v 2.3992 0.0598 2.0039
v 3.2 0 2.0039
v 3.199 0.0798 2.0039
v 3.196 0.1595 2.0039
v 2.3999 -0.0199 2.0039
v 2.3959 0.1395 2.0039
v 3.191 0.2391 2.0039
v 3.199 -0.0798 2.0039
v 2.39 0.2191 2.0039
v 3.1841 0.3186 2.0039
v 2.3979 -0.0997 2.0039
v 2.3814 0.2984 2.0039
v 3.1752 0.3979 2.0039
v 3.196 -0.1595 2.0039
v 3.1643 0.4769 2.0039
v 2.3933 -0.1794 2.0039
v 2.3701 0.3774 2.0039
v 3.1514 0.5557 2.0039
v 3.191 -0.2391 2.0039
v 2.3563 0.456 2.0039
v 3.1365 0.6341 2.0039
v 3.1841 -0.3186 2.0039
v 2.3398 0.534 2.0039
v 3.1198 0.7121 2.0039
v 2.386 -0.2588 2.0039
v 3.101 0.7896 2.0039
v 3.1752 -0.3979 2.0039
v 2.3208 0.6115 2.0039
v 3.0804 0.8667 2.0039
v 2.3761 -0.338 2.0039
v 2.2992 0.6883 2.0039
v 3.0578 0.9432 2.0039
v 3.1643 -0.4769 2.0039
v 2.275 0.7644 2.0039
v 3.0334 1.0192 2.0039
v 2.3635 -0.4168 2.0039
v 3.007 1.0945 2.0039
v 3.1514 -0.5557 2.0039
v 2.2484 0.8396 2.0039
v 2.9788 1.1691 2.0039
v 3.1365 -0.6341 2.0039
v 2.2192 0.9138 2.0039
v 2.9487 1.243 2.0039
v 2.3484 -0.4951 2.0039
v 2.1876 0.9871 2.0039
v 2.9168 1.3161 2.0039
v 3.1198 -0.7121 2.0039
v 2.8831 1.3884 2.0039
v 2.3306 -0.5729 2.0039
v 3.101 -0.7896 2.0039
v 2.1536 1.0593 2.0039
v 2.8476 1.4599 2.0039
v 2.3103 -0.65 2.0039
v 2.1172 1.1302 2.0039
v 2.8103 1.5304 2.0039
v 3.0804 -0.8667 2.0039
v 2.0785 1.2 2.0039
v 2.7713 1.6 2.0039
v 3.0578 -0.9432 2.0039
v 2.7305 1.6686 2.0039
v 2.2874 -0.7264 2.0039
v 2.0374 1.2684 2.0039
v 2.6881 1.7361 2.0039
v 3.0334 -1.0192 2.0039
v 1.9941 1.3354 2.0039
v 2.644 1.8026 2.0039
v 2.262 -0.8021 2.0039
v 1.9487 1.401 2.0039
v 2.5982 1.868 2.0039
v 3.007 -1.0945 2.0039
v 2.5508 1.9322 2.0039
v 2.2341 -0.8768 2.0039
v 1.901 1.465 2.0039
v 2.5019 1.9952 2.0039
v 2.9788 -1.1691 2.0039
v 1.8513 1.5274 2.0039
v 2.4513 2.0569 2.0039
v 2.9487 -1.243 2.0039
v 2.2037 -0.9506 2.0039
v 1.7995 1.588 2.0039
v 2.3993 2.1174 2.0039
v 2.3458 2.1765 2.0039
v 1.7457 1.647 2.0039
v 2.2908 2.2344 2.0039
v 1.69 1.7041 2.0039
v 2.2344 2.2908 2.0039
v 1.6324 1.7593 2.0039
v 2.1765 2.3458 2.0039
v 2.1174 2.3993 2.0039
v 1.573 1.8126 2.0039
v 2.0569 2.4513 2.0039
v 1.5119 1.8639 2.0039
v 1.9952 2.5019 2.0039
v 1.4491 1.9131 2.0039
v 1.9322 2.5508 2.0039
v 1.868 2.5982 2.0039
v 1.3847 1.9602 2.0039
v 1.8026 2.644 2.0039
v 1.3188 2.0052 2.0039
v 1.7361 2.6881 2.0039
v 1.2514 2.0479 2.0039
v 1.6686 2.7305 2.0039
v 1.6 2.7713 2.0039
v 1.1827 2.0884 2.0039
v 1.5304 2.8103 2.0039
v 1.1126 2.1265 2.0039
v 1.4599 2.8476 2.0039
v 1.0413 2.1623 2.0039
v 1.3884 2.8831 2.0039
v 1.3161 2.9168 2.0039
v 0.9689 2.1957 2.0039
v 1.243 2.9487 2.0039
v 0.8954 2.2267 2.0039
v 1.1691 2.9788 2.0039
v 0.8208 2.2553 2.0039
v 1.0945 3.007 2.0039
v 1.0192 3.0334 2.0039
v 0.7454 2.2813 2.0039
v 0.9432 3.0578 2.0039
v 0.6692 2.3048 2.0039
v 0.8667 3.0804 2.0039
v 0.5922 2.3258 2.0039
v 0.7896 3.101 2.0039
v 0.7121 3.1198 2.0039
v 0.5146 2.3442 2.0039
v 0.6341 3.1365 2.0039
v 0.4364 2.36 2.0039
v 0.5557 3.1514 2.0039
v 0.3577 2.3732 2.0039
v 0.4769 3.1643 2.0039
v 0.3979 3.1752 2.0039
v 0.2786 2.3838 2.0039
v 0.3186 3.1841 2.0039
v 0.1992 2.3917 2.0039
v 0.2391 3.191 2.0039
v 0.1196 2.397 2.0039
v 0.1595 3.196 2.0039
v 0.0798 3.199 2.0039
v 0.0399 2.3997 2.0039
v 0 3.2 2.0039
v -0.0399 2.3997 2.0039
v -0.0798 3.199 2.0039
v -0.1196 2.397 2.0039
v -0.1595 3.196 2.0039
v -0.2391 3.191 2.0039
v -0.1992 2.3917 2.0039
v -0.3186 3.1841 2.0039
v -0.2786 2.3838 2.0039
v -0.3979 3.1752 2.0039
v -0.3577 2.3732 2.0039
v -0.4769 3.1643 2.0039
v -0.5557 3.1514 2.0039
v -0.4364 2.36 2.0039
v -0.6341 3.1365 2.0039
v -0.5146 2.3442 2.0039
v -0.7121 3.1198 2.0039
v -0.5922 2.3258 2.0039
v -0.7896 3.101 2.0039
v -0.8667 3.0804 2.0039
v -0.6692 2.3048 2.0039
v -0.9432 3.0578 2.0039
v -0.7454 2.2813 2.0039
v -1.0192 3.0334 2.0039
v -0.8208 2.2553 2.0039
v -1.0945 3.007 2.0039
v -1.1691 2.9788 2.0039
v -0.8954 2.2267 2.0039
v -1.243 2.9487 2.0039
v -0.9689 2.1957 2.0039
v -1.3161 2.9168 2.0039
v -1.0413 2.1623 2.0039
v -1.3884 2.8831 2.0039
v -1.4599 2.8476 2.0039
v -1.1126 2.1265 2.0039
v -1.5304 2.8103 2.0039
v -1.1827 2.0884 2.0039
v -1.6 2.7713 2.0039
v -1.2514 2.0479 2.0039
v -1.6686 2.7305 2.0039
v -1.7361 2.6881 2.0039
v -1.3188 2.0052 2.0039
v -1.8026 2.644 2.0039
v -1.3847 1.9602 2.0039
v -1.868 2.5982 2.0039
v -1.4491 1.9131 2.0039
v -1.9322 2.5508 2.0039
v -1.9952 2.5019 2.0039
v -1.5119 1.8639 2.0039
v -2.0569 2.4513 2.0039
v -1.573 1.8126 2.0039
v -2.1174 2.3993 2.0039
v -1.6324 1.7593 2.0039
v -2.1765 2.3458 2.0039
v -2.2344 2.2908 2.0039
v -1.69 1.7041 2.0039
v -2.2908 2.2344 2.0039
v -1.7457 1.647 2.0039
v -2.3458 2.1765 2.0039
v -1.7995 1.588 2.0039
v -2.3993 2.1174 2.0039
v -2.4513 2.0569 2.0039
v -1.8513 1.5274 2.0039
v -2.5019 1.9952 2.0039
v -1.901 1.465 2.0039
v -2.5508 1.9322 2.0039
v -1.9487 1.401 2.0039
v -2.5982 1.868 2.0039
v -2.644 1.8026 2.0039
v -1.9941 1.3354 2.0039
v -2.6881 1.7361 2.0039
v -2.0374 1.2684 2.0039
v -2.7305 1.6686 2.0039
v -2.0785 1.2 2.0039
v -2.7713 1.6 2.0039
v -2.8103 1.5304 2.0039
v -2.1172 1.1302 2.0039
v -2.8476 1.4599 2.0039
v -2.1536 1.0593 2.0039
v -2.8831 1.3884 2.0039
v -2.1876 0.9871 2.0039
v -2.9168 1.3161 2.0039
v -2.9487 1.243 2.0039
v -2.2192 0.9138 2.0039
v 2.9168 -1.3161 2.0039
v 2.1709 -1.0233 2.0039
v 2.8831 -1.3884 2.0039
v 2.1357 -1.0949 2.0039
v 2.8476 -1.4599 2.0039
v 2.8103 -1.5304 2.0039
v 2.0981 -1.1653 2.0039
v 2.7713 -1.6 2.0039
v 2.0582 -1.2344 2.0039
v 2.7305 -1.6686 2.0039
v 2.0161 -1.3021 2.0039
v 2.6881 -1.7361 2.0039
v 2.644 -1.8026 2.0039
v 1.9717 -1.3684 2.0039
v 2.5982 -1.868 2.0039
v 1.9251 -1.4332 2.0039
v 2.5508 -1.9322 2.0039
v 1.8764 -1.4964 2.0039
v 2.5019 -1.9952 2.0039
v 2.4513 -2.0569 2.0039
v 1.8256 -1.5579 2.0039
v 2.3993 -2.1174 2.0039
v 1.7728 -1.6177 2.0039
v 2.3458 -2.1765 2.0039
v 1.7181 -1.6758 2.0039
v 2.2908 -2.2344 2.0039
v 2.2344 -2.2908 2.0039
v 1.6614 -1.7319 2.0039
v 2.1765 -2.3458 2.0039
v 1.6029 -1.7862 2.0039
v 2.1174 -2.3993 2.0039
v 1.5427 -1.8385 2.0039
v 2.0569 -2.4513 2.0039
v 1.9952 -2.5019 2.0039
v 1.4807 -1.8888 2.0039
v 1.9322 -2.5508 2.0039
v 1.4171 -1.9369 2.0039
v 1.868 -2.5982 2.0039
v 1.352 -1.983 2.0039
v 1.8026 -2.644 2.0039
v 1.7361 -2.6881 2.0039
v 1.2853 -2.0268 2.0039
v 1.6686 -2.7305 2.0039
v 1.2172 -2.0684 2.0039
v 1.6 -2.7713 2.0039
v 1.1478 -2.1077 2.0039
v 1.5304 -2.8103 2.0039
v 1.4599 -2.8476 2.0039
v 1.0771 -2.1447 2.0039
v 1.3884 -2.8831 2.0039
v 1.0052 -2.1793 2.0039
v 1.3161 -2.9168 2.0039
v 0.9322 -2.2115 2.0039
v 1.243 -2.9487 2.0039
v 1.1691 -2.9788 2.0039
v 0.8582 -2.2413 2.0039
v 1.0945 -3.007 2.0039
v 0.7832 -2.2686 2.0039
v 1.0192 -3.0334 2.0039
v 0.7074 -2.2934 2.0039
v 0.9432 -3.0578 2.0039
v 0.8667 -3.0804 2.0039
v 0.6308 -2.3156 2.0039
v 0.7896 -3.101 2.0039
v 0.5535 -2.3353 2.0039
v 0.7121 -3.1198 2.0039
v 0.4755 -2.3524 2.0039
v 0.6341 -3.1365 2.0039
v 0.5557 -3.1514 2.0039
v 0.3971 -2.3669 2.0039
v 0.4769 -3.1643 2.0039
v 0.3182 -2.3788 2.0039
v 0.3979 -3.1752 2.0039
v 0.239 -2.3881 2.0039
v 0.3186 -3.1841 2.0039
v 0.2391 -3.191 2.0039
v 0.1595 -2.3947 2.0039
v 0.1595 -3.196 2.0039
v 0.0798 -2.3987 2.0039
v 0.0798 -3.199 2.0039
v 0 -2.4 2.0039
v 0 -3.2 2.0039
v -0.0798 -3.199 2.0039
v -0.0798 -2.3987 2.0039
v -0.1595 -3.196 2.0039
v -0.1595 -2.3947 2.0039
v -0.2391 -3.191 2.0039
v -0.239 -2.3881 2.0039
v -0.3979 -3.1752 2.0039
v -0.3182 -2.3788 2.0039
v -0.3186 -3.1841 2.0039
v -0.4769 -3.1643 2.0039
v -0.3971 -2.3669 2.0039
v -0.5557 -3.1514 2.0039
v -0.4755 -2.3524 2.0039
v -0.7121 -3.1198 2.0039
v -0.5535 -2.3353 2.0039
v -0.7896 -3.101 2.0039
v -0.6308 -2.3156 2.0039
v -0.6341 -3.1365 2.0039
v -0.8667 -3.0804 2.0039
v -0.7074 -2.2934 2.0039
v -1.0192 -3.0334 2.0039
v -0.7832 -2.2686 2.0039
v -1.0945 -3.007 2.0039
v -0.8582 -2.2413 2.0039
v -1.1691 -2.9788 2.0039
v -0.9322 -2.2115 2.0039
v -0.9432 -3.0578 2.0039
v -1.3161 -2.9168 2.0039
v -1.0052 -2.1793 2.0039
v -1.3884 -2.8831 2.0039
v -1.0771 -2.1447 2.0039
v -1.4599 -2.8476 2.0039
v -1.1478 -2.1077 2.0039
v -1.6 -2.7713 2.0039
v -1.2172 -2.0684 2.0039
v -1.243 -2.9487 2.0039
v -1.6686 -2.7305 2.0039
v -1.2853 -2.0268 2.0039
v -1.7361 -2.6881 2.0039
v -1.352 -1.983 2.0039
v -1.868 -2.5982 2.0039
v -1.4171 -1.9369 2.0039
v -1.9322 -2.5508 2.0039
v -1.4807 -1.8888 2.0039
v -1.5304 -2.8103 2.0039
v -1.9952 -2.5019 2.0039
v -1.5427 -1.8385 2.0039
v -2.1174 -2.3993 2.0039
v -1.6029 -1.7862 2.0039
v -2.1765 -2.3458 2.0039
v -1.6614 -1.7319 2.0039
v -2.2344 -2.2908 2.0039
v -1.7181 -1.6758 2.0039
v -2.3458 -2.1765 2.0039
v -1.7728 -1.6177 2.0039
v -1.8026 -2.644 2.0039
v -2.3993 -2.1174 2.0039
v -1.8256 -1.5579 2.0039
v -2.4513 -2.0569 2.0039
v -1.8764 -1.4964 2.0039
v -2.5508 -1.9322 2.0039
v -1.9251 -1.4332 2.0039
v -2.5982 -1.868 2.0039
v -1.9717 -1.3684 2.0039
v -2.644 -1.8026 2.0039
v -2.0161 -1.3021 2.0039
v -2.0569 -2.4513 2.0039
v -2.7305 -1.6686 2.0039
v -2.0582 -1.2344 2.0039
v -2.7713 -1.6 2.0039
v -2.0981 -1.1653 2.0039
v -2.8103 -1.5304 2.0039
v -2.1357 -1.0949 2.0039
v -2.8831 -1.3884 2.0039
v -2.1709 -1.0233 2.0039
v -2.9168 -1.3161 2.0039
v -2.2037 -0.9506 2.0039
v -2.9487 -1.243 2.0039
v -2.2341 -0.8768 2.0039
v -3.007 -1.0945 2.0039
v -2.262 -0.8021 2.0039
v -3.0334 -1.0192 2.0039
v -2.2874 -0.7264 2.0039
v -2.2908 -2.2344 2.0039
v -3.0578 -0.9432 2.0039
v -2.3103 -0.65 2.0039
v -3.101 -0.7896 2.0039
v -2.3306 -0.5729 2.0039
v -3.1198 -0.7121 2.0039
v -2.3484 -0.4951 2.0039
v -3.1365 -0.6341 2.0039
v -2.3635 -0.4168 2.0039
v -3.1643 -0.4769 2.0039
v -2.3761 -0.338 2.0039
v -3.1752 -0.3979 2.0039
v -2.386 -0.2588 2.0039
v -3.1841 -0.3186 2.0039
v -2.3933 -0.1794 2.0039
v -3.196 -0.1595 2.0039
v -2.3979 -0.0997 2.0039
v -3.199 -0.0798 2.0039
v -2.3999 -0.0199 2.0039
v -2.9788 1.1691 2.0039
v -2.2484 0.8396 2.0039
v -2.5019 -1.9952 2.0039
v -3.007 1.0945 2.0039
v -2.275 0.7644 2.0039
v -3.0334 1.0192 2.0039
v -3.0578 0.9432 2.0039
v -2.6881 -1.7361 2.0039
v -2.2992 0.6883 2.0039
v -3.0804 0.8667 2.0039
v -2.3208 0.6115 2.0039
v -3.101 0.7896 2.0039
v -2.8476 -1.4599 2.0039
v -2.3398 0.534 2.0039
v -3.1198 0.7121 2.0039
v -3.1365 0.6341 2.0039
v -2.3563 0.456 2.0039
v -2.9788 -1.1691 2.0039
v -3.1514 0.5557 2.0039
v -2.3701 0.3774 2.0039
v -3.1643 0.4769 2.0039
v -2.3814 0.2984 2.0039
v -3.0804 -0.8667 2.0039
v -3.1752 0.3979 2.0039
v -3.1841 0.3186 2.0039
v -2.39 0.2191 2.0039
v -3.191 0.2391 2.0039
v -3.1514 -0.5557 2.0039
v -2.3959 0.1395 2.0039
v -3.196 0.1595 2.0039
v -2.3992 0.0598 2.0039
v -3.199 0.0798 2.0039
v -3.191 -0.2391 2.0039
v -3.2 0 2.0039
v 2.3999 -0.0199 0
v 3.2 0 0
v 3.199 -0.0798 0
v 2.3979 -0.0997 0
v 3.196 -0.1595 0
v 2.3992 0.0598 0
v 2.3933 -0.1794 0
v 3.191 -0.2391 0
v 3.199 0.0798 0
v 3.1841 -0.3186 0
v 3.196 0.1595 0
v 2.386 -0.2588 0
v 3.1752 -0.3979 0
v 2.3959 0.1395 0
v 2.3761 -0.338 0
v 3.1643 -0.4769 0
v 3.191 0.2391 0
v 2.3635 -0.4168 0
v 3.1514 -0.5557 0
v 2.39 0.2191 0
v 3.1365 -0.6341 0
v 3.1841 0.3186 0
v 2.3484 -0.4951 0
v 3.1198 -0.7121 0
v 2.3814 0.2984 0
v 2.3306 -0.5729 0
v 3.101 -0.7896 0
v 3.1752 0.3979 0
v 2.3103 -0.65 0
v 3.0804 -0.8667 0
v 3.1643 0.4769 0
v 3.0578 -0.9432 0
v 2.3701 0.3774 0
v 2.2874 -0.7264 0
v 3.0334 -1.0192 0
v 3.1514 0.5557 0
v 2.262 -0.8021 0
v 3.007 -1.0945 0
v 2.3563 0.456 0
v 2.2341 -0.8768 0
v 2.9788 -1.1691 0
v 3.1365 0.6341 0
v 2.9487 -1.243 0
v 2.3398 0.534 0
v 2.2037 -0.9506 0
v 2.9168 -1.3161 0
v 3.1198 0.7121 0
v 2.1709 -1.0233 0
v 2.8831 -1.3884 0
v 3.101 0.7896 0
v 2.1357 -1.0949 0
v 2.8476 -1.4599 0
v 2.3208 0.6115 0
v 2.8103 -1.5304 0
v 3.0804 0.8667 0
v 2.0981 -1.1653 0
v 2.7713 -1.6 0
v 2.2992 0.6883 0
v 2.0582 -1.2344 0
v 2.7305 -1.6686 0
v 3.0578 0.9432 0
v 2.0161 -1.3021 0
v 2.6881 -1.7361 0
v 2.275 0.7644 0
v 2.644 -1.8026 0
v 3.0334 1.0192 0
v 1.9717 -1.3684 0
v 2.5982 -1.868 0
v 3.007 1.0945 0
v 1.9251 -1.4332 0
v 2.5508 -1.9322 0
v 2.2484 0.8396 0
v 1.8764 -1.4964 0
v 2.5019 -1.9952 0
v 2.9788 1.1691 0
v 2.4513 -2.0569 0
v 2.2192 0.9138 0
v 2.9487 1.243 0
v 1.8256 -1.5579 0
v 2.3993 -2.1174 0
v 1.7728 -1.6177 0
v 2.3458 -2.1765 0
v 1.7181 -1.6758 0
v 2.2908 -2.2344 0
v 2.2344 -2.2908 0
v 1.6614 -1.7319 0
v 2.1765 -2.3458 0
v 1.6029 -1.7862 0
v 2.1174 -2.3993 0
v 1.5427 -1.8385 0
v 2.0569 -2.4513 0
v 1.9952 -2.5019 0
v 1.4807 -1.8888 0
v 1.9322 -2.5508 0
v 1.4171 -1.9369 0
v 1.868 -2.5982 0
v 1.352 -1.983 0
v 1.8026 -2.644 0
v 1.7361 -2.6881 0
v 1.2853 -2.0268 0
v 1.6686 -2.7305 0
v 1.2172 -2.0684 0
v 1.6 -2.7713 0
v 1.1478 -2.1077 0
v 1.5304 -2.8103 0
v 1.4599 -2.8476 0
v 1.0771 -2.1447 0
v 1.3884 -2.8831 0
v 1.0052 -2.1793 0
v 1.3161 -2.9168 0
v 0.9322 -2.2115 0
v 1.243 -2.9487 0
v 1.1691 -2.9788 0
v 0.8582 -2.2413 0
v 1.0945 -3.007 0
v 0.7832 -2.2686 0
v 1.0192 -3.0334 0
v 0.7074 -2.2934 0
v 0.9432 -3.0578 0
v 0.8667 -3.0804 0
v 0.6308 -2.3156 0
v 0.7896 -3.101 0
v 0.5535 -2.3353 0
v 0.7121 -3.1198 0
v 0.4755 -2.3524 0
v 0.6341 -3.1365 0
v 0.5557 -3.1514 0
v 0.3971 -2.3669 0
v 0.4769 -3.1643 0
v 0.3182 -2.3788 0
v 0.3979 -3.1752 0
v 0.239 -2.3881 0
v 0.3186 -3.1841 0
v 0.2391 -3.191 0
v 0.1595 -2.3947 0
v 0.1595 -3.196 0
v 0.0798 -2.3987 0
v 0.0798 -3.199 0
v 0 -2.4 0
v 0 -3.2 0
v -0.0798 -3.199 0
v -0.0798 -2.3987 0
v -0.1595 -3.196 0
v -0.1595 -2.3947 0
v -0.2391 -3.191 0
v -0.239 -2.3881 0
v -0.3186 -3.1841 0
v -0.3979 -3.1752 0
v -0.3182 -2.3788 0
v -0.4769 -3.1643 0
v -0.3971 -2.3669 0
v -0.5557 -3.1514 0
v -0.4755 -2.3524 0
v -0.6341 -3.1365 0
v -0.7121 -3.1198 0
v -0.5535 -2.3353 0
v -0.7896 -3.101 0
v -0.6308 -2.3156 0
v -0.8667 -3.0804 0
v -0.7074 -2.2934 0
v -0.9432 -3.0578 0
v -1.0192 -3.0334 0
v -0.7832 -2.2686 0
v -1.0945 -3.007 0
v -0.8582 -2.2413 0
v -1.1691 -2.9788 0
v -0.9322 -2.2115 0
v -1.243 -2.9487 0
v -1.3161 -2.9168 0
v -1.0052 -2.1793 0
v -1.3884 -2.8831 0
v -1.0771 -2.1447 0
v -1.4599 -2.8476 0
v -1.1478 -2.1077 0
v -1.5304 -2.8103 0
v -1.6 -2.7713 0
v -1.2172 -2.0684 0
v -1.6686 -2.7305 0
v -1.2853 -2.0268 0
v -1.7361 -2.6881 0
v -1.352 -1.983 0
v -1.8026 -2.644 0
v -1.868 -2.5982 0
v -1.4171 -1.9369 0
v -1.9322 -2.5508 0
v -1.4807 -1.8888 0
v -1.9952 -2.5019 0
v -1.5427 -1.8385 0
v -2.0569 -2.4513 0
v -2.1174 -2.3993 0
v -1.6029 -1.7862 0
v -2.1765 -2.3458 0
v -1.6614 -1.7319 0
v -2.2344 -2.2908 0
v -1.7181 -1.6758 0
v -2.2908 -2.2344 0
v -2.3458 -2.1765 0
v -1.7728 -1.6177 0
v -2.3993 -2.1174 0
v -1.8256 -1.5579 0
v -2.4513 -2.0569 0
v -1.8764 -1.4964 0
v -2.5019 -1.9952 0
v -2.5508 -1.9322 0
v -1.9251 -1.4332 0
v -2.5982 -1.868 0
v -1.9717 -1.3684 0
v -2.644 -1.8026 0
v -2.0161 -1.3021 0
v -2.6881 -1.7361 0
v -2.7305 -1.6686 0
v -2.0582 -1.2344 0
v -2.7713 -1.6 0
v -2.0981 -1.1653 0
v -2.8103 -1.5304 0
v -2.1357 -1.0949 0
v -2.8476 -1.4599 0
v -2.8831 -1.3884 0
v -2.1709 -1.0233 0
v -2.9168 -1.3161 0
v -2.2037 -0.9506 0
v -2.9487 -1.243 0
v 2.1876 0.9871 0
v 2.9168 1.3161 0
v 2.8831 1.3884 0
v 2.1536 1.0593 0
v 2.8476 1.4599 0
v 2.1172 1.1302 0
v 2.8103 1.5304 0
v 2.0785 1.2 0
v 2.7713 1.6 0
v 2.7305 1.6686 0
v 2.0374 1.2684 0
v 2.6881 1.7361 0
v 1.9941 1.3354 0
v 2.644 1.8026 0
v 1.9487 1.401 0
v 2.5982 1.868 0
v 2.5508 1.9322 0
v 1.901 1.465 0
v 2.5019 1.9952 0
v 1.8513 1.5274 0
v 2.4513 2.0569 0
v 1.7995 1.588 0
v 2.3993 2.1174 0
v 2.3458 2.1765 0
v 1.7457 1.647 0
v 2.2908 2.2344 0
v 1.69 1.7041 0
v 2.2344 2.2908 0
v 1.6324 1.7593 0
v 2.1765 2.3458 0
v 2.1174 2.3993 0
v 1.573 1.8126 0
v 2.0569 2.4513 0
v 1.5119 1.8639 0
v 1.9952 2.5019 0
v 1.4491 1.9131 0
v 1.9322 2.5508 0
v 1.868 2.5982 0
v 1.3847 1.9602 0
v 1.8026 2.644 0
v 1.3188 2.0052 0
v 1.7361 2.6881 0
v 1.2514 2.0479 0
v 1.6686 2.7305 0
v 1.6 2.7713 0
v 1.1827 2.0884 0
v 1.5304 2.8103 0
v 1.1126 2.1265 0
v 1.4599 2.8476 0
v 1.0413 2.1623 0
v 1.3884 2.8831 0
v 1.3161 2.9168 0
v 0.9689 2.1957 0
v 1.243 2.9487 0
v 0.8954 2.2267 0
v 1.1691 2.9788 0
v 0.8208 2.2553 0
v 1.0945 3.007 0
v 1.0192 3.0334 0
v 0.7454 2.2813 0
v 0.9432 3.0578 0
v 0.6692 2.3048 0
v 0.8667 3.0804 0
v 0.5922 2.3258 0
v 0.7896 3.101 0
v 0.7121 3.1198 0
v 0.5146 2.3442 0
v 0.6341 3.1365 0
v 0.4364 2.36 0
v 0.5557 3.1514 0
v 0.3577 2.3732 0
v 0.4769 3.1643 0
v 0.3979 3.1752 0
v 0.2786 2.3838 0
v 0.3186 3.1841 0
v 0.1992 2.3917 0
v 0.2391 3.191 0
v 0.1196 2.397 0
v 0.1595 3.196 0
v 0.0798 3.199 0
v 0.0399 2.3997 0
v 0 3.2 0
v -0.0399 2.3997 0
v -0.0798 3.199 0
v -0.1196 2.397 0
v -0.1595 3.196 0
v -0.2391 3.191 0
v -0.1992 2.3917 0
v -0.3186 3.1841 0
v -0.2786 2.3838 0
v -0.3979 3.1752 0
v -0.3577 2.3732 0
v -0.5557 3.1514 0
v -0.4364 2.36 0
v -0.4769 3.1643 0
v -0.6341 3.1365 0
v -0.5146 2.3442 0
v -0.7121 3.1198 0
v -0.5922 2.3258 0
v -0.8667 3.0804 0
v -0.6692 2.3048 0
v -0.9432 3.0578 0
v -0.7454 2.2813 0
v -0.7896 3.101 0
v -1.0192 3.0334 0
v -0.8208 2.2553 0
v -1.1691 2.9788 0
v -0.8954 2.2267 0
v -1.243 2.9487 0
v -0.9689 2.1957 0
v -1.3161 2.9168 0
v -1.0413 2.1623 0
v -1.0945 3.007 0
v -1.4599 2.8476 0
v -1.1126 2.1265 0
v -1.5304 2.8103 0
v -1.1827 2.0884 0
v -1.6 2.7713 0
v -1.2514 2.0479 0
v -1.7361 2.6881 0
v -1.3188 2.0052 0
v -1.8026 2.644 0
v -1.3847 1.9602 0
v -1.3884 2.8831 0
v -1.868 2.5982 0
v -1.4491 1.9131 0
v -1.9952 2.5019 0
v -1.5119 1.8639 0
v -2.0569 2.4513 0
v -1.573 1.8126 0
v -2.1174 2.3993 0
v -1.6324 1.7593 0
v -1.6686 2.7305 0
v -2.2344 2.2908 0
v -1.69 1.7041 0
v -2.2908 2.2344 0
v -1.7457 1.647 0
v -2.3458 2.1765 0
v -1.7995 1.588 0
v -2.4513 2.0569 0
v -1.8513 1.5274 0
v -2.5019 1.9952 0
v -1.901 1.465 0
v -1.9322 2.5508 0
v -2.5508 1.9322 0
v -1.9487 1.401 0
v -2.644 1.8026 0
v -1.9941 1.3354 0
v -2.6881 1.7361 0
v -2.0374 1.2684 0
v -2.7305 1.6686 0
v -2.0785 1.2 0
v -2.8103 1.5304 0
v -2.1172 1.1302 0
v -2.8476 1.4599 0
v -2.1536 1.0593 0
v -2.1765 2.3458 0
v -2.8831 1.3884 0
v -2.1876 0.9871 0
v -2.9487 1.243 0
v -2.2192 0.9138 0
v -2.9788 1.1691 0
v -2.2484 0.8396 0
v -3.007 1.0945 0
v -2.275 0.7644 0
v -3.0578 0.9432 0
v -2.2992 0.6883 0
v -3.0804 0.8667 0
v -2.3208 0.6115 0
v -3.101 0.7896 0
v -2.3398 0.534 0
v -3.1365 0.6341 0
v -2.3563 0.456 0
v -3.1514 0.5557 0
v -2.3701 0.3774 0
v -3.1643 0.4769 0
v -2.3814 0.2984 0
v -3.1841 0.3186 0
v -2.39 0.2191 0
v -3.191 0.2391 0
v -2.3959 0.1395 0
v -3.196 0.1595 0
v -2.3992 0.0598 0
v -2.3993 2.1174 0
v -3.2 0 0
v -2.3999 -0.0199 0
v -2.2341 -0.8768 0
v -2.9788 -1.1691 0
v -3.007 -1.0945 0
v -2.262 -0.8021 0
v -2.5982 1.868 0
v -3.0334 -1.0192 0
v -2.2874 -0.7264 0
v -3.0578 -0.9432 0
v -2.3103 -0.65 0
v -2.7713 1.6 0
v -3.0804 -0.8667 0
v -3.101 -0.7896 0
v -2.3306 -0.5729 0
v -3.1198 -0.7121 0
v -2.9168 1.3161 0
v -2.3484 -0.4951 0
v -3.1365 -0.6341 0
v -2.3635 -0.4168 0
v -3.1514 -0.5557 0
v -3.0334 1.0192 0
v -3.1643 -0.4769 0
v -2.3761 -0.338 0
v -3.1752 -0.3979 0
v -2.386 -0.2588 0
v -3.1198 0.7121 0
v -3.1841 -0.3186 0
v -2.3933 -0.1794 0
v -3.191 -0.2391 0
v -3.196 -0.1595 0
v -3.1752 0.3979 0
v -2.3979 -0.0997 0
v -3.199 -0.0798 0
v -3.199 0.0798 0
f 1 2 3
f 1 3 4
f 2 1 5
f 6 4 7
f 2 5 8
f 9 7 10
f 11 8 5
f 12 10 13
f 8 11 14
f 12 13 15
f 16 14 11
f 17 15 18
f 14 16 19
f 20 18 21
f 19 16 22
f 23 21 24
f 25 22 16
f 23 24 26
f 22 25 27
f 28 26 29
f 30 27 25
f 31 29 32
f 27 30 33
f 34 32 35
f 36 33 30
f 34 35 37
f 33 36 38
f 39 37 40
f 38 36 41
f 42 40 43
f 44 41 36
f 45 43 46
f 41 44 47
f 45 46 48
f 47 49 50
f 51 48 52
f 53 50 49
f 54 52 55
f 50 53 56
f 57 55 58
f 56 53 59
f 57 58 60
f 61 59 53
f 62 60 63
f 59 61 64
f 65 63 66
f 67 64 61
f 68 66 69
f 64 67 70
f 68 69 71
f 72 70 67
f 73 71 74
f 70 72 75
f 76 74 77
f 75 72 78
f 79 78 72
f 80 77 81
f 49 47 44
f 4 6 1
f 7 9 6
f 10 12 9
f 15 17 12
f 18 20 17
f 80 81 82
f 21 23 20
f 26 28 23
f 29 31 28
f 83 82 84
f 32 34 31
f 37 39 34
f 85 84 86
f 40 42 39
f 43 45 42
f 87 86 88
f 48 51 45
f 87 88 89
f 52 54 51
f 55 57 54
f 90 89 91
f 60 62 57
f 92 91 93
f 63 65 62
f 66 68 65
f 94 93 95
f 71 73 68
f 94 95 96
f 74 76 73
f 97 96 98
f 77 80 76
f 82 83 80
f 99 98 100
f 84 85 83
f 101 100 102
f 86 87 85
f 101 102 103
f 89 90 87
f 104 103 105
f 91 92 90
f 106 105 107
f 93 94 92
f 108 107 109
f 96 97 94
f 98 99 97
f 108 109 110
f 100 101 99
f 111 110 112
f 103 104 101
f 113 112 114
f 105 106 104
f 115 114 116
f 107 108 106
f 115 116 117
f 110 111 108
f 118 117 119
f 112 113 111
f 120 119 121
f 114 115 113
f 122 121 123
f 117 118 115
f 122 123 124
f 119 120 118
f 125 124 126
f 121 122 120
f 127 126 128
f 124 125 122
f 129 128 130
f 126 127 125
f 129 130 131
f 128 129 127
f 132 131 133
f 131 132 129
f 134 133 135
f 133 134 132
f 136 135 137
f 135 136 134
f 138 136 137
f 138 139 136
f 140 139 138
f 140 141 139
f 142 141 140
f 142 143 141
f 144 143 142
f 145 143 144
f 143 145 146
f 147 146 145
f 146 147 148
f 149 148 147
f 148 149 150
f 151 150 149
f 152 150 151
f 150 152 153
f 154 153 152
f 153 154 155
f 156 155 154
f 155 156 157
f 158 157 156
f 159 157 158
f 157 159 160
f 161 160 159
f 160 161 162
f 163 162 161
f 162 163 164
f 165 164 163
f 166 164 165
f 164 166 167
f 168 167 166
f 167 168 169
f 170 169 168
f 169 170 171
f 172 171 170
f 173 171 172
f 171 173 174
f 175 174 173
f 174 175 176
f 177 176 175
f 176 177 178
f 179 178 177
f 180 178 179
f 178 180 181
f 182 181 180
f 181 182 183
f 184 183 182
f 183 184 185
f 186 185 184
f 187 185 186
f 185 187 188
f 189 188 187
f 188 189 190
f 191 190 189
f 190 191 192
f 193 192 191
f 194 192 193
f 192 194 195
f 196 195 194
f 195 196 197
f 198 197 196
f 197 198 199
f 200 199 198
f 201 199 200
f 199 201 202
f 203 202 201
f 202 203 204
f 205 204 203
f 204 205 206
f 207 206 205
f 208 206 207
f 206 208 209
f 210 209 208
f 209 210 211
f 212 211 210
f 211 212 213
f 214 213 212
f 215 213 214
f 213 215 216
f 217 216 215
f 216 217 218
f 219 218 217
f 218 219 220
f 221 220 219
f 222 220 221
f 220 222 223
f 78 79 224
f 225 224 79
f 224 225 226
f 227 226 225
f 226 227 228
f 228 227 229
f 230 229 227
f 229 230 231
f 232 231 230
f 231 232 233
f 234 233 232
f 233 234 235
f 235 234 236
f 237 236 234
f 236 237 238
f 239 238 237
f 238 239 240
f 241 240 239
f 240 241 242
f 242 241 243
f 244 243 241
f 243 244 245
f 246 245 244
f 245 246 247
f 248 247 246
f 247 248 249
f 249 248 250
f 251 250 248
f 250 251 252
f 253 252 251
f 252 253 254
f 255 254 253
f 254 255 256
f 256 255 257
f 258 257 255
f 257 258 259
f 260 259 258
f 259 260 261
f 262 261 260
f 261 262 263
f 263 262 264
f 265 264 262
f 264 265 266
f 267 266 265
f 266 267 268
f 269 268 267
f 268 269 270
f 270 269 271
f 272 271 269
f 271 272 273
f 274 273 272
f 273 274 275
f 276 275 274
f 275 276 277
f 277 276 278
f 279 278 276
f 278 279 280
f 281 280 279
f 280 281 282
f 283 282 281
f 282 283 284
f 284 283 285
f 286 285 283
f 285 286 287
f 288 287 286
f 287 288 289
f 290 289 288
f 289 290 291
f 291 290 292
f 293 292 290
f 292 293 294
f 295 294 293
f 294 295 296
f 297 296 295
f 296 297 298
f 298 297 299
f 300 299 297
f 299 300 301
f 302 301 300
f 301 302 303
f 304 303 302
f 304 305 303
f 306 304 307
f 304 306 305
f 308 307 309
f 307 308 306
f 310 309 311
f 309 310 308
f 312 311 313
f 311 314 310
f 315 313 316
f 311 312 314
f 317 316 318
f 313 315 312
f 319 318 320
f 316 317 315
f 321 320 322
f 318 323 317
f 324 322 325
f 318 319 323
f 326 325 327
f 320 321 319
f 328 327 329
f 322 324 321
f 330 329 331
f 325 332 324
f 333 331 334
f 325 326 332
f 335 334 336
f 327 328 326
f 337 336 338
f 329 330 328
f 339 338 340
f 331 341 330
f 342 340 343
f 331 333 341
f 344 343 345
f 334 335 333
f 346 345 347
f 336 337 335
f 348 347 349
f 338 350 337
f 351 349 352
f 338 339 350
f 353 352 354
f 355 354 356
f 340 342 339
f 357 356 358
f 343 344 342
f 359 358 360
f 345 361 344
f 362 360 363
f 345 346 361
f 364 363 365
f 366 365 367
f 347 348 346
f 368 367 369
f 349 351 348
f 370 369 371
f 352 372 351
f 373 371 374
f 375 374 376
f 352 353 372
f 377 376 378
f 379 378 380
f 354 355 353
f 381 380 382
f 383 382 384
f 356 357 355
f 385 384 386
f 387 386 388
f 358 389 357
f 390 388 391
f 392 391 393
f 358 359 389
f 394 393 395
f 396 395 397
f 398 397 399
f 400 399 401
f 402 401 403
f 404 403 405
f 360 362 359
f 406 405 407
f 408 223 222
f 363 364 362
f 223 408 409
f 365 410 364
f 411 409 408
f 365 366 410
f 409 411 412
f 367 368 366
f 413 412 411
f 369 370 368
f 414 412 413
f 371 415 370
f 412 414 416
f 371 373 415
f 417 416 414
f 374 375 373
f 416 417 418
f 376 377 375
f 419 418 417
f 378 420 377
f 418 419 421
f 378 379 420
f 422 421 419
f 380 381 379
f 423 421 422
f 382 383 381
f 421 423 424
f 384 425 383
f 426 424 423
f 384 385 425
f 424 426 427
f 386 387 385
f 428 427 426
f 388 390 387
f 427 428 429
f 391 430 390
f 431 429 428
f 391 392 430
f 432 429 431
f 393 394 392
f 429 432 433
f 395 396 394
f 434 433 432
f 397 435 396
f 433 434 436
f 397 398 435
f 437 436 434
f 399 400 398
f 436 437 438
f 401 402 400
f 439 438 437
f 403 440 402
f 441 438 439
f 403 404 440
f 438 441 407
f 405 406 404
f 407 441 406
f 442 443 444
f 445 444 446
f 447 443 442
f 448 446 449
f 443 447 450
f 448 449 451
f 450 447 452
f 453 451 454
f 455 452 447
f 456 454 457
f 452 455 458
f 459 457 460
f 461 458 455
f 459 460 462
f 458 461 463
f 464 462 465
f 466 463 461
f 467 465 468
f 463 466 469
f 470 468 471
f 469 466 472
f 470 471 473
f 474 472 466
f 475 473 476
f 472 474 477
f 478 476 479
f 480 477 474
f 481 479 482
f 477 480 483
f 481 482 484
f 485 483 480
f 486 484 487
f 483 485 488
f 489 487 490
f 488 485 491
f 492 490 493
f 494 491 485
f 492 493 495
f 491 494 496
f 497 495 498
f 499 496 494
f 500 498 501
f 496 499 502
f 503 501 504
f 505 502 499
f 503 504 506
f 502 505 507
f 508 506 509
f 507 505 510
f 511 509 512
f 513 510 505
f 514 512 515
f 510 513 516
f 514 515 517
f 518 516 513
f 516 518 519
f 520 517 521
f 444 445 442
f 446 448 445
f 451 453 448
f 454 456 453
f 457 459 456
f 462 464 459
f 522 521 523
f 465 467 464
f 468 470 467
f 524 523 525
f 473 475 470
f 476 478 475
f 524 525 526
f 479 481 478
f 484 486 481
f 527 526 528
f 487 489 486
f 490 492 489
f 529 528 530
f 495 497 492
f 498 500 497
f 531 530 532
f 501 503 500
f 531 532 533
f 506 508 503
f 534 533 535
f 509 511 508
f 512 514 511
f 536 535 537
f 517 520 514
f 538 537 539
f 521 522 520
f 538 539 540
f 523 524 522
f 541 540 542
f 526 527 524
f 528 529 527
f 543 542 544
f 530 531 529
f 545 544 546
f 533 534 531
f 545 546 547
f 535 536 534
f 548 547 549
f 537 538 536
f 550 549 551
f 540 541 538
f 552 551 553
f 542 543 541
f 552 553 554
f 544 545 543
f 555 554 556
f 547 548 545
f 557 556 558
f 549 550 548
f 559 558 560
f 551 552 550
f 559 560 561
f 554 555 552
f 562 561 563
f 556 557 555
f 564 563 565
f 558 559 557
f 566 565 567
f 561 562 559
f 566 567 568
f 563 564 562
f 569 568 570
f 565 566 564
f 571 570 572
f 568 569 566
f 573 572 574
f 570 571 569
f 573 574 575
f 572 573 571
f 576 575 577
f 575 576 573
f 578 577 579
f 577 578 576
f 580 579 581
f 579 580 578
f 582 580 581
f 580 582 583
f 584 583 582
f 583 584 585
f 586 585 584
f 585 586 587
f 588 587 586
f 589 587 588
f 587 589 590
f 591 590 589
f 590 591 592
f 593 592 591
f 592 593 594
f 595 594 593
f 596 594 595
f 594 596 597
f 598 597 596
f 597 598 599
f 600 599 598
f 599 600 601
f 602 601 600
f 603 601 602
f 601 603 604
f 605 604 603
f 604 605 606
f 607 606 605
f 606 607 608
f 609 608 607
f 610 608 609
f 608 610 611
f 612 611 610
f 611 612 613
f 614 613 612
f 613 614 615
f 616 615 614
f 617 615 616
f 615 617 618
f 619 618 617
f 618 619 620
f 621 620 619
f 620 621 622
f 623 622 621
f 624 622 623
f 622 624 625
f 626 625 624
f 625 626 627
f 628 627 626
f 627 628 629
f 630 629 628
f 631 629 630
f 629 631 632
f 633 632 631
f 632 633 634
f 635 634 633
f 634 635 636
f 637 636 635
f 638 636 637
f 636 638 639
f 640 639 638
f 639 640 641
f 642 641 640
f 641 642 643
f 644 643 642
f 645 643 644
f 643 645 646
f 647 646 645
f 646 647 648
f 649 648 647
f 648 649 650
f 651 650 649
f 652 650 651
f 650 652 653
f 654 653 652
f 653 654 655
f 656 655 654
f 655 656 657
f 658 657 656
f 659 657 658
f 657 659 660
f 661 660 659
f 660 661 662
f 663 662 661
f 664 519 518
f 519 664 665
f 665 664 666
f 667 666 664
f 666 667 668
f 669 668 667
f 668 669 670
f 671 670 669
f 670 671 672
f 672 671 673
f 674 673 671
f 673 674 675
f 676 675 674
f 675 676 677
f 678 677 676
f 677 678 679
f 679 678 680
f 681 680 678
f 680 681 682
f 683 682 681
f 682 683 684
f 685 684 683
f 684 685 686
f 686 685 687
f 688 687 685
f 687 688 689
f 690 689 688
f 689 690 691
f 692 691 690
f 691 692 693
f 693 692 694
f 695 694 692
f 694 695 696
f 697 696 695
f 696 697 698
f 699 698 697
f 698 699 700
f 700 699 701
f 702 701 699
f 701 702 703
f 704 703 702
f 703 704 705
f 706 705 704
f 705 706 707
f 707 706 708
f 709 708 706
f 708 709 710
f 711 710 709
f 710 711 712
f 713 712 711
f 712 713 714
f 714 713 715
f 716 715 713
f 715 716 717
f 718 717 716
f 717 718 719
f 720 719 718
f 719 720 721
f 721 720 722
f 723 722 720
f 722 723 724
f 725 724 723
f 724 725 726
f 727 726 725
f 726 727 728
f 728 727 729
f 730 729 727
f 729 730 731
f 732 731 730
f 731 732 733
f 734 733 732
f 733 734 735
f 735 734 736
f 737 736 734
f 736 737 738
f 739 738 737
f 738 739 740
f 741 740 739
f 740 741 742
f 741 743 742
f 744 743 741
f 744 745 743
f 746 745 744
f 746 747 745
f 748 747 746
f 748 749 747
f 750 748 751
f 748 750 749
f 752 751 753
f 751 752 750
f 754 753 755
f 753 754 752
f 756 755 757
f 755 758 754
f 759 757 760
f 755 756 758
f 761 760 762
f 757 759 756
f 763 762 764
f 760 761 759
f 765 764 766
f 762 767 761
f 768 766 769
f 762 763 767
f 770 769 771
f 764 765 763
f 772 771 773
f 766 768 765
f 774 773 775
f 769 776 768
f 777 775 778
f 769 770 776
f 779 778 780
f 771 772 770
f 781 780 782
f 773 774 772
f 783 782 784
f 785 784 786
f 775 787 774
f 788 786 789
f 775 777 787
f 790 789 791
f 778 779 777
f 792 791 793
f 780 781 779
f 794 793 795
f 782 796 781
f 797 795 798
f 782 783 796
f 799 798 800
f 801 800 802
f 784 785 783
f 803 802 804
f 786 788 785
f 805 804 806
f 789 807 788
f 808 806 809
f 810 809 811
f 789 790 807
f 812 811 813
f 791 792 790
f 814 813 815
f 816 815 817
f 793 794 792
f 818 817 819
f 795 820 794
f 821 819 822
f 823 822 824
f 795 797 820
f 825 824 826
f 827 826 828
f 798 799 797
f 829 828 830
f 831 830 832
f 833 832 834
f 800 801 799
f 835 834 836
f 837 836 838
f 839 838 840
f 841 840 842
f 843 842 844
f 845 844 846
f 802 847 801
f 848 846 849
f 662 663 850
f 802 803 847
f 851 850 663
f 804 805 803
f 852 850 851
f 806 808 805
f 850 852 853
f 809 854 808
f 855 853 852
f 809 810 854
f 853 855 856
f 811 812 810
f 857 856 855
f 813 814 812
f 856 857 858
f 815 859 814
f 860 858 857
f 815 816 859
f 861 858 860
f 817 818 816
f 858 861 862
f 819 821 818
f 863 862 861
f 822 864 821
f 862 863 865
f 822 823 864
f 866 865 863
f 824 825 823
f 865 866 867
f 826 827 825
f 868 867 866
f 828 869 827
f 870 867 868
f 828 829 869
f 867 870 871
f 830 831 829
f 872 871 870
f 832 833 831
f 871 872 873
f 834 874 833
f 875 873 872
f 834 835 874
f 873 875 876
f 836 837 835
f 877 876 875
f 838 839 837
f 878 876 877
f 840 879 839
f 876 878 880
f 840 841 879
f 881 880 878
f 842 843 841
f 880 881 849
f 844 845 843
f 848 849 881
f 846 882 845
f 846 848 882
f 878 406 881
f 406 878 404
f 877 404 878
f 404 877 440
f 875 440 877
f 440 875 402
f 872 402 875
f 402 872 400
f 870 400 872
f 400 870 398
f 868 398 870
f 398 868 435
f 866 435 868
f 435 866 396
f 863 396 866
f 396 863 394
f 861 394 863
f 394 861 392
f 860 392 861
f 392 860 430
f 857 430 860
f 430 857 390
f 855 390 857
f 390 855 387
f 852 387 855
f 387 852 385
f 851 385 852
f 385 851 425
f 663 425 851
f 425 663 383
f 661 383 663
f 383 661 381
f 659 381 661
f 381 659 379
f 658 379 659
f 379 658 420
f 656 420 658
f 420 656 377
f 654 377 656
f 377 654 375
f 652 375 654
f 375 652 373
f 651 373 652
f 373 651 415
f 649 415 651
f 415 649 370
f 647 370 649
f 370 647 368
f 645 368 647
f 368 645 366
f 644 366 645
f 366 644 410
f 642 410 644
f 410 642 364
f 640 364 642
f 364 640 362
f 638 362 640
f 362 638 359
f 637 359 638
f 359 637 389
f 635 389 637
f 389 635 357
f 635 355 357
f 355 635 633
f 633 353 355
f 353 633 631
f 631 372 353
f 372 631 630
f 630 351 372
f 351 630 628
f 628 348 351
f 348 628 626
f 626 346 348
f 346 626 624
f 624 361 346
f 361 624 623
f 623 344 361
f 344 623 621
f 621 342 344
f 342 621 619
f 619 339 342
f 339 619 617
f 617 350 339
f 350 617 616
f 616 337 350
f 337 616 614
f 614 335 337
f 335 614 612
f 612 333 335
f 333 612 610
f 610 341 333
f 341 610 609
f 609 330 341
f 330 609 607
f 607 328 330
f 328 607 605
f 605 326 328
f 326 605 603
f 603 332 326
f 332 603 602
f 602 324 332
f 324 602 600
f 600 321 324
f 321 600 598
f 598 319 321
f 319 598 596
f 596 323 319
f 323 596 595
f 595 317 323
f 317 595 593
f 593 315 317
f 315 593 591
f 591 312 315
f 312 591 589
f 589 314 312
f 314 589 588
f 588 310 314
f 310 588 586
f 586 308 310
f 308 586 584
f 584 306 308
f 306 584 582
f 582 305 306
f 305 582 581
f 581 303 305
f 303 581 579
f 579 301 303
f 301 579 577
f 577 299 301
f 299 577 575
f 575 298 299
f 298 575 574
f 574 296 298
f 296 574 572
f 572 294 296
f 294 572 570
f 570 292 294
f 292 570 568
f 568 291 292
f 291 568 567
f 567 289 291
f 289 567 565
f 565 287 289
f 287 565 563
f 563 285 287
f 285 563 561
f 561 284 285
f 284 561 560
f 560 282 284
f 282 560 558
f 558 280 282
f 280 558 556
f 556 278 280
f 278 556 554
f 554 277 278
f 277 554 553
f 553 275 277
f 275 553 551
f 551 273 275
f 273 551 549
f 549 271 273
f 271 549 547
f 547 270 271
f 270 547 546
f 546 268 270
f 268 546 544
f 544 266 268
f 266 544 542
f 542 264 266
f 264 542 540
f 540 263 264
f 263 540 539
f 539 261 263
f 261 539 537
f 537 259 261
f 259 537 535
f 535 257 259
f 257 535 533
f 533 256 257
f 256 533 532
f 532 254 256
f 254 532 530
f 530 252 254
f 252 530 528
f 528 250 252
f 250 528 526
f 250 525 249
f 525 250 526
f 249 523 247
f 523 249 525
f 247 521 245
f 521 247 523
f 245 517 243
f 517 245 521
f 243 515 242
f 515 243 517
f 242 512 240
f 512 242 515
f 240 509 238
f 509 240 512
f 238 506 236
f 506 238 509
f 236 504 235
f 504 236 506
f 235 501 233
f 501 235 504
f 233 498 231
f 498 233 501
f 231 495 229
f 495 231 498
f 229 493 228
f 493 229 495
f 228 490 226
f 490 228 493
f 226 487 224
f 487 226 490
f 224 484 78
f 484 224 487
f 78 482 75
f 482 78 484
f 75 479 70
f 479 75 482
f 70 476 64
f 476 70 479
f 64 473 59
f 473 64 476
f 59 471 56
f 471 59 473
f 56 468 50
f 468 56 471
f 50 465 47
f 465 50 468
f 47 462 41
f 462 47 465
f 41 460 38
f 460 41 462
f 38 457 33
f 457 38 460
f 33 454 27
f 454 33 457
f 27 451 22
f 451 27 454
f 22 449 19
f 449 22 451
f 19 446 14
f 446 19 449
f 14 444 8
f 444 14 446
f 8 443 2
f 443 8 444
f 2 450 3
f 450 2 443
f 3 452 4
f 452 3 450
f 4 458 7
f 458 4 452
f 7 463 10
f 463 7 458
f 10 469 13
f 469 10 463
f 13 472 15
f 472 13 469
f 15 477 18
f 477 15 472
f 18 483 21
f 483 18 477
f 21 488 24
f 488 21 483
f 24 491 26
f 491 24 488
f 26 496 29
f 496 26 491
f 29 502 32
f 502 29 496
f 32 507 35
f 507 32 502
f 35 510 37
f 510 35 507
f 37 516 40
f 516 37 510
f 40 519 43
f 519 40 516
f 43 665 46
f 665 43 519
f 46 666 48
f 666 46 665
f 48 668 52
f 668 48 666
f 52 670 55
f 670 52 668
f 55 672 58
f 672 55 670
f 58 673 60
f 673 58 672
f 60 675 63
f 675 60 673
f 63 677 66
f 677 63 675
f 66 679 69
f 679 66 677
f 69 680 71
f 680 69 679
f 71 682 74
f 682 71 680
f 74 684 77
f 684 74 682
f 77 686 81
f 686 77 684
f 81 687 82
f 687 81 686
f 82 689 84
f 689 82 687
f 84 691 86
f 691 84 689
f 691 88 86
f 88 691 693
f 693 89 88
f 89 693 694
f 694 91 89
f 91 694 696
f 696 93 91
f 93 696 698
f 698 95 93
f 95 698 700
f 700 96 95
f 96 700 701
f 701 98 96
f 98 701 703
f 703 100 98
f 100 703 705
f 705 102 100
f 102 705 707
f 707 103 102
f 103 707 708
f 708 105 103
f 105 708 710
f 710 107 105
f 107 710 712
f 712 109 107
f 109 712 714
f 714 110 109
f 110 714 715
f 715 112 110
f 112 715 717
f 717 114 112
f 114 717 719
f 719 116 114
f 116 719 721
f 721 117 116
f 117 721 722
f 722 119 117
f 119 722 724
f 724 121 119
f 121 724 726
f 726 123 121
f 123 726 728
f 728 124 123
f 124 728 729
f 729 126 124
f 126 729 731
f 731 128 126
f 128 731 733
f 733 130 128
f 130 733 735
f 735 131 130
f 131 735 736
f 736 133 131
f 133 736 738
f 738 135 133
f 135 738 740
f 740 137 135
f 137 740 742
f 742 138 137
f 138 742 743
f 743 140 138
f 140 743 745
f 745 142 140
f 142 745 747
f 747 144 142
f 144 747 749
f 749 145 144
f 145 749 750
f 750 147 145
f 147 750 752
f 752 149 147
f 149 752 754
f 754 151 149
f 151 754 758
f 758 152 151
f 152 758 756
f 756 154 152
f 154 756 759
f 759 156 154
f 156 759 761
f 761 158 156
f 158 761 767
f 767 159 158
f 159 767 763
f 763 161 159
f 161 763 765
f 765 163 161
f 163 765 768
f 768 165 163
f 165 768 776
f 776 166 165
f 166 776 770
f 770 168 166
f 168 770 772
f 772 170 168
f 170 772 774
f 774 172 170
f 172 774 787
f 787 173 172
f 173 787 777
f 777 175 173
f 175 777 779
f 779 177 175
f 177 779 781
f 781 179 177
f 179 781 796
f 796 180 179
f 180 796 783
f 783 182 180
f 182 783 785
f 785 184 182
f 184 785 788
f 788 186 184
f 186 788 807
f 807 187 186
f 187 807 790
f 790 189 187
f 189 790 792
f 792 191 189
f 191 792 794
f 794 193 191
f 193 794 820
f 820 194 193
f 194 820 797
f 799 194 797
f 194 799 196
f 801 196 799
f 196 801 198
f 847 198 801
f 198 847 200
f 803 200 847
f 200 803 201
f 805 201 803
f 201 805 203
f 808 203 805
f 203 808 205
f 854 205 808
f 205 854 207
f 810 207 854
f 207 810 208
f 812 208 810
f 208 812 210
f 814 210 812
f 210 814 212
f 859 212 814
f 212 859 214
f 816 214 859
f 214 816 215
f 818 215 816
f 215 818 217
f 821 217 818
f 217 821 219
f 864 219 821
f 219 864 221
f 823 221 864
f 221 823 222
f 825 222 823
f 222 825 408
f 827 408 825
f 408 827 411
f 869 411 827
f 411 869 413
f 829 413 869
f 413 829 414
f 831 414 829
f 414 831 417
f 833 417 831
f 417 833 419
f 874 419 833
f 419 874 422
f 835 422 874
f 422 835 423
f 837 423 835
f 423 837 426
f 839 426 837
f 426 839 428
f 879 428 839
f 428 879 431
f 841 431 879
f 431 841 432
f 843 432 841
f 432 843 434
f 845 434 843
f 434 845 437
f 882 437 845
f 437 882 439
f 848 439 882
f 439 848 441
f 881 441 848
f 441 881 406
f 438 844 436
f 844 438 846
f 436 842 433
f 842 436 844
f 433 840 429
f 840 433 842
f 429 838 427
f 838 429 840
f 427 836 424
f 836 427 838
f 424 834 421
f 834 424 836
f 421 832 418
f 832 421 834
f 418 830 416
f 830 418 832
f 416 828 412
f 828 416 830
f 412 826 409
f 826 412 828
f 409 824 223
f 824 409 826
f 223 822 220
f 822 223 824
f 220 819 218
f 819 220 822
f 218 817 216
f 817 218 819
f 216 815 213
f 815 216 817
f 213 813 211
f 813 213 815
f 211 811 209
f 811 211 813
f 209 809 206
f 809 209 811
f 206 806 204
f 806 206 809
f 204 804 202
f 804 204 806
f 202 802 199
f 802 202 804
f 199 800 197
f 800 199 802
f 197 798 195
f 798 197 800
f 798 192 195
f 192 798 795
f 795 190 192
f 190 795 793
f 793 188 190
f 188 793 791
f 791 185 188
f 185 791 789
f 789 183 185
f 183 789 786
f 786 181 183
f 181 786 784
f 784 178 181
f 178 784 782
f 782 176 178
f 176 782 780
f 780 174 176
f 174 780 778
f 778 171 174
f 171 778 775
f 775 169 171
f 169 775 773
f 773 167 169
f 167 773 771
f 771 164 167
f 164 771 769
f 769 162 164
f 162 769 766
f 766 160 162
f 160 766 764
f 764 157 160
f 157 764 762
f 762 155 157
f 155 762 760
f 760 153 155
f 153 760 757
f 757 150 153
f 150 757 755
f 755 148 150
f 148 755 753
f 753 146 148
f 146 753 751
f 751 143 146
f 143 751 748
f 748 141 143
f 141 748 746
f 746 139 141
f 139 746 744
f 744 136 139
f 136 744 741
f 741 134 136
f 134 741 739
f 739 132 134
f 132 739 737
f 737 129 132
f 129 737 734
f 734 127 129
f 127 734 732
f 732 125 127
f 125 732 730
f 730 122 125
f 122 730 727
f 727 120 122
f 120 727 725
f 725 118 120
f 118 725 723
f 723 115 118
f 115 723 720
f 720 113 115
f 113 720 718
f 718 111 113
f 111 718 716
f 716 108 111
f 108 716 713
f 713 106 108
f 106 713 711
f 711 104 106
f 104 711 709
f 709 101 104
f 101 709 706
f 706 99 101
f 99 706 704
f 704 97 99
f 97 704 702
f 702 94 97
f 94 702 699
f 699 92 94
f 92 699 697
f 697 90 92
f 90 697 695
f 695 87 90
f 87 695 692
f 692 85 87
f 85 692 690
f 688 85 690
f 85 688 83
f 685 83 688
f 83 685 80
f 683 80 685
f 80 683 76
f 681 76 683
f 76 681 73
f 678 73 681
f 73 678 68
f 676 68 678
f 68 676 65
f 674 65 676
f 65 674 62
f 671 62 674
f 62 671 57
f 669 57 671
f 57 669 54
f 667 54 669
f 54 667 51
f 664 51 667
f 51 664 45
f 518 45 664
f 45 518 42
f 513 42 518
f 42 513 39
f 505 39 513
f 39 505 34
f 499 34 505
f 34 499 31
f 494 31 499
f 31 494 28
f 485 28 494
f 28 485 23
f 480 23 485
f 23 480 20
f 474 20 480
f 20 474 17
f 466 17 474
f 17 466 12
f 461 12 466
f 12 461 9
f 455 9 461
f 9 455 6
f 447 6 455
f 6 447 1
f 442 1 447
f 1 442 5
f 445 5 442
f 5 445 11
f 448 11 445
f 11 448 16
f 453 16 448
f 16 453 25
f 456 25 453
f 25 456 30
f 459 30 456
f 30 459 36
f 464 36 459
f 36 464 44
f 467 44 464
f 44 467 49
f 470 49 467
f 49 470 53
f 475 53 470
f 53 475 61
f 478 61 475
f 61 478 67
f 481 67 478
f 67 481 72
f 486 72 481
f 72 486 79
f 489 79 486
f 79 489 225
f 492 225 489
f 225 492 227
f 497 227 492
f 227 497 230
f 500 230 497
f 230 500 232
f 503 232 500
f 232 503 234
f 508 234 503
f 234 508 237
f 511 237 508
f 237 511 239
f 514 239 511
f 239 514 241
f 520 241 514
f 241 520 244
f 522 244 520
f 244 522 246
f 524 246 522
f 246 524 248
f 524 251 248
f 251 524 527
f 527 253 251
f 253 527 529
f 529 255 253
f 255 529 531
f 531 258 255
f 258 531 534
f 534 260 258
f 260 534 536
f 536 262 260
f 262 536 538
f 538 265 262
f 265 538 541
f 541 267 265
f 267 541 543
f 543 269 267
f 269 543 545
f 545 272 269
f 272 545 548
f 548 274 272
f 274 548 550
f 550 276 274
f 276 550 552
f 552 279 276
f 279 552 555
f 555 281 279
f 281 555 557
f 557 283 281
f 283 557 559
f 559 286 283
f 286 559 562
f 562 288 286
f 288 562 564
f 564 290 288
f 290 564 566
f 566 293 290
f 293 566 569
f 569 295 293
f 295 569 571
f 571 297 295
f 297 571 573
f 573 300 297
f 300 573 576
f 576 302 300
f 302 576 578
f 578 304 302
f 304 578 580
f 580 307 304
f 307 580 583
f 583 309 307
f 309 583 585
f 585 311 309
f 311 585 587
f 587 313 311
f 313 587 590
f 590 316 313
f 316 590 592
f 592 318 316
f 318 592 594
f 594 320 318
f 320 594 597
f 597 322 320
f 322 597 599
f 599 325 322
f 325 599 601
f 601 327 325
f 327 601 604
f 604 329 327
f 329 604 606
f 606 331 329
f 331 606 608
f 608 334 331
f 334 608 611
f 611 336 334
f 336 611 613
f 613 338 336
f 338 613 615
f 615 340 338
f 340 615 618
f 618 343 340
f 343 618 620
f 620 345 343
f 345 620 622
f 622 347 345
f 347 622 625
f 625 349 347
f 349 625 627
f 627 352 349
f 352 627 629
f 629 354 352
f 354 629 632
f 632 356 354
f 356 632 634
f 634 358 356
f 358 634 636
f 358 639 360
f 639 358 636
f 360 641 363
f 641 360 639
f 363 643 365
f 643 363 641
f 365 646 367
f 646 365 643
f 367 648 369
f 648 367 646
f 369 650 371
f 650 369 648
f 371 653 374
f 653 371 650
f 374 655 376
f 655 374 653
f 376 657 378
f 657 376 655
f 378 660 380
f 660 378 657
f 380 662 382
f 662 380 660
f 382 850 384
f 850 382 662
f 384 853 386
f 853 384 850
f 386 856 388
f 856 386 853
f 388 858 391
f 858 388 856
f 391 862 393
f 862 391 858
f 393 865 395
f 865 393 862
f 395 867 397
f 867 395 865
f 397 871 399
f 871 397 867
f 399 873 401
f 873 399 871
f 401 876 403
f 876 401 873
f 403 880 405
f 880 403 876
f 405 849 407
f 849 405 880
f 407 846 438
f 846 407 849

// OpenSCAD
use <../lib.scad>
use <../p/r04o1000.scad>
use <s/34172s01.scad>
$fa=1; $fs=0.2;
function ldraw_lib__34172(realsolid=false) = [
// 0 Minifig Rice Bowl
// 0 Name: 34172.dat
// 0 Author: Gerald Lasser [GeraldLasser]
// 0 !LDRAW_ORG Part UPDATE 2018-02
// 0 !LICENSE Licensed under CC BY 2.0 and CC BY 4.0 : see CAreadme.txt
// 
// 0 BFC CERTIFY CCW
  [0,"BFC","CERTIFY"],
  [0,"BFC","CCW"],
// 
// 0 !CATEGORY Minifig Accessory
// 0 !KEYWORDS East Asia, Ninjago
// 
// 0 !HISTORY 2018-03-23 [cwdee] Use t04ounit instead of duplicate r04o1000
// 0 !HISTORY 2018-03-26 [cwdee] Revert to r04o1000
// 0 !HISTORY 2018-12-08 [PTadmin] Official Update 2018-02
// 
// 
// 1 16 0 0 0 1 0 0 0 1 0 0 0 1 s\34172s01.dat
  [1,16,0,0,0,1,0,0,0,1,0,0,0,1, ldraw_lib__s__34172s01(realsolid)],
// 
// 1 16 0 -16 0 7.25 0 0 0 11.231 0 0 0 7.25 r04o1000.dat
  [1,16,0,-16,0,7.25,0,0,0,11.231,0,0,0,7.25, ldraw_lib__r04o1000(realsolid)],
// 1 16 0 -16 0 7.25 0 0 0 11.231 0 0 0 -7.25 r04o1000.dat
  [1,16,0,-16,0,7.25,0,0,0,11.231,0,0,0,-7.25, ldraw_lib__r04o1000(realsolid)],
// 1 16 0 -16 0 -7.25 0 0 0 11.231 0 0 0 7.25 r04o1000.dat
  [1,16,0,-16,0,-7.25,0,0,0,11.231,0,0,0,7.25, ldraw_lib__r04o1000(realsolid)],
// 1 16 0 -16 0 -7.25 0 0 0 11.231 0 0 0 -7.25 r04o1000.dat
  [1,16,0,-16,0,-7.25,0,0,0,11.231,0,0,0,-7.25, ldraw_lib__r04o1000(realsolid)],
];
module ldraw_lib__34172(step=0, col=false, unit=2/5, alt=false, line=0.2, solid=!$preview)
    makepoly(ldraw_lib__34172(solid), step=step, col=col, unit=unit, alt=alt, line=line, solid=solid);
ldraw_lib__34172(line=0.2);
